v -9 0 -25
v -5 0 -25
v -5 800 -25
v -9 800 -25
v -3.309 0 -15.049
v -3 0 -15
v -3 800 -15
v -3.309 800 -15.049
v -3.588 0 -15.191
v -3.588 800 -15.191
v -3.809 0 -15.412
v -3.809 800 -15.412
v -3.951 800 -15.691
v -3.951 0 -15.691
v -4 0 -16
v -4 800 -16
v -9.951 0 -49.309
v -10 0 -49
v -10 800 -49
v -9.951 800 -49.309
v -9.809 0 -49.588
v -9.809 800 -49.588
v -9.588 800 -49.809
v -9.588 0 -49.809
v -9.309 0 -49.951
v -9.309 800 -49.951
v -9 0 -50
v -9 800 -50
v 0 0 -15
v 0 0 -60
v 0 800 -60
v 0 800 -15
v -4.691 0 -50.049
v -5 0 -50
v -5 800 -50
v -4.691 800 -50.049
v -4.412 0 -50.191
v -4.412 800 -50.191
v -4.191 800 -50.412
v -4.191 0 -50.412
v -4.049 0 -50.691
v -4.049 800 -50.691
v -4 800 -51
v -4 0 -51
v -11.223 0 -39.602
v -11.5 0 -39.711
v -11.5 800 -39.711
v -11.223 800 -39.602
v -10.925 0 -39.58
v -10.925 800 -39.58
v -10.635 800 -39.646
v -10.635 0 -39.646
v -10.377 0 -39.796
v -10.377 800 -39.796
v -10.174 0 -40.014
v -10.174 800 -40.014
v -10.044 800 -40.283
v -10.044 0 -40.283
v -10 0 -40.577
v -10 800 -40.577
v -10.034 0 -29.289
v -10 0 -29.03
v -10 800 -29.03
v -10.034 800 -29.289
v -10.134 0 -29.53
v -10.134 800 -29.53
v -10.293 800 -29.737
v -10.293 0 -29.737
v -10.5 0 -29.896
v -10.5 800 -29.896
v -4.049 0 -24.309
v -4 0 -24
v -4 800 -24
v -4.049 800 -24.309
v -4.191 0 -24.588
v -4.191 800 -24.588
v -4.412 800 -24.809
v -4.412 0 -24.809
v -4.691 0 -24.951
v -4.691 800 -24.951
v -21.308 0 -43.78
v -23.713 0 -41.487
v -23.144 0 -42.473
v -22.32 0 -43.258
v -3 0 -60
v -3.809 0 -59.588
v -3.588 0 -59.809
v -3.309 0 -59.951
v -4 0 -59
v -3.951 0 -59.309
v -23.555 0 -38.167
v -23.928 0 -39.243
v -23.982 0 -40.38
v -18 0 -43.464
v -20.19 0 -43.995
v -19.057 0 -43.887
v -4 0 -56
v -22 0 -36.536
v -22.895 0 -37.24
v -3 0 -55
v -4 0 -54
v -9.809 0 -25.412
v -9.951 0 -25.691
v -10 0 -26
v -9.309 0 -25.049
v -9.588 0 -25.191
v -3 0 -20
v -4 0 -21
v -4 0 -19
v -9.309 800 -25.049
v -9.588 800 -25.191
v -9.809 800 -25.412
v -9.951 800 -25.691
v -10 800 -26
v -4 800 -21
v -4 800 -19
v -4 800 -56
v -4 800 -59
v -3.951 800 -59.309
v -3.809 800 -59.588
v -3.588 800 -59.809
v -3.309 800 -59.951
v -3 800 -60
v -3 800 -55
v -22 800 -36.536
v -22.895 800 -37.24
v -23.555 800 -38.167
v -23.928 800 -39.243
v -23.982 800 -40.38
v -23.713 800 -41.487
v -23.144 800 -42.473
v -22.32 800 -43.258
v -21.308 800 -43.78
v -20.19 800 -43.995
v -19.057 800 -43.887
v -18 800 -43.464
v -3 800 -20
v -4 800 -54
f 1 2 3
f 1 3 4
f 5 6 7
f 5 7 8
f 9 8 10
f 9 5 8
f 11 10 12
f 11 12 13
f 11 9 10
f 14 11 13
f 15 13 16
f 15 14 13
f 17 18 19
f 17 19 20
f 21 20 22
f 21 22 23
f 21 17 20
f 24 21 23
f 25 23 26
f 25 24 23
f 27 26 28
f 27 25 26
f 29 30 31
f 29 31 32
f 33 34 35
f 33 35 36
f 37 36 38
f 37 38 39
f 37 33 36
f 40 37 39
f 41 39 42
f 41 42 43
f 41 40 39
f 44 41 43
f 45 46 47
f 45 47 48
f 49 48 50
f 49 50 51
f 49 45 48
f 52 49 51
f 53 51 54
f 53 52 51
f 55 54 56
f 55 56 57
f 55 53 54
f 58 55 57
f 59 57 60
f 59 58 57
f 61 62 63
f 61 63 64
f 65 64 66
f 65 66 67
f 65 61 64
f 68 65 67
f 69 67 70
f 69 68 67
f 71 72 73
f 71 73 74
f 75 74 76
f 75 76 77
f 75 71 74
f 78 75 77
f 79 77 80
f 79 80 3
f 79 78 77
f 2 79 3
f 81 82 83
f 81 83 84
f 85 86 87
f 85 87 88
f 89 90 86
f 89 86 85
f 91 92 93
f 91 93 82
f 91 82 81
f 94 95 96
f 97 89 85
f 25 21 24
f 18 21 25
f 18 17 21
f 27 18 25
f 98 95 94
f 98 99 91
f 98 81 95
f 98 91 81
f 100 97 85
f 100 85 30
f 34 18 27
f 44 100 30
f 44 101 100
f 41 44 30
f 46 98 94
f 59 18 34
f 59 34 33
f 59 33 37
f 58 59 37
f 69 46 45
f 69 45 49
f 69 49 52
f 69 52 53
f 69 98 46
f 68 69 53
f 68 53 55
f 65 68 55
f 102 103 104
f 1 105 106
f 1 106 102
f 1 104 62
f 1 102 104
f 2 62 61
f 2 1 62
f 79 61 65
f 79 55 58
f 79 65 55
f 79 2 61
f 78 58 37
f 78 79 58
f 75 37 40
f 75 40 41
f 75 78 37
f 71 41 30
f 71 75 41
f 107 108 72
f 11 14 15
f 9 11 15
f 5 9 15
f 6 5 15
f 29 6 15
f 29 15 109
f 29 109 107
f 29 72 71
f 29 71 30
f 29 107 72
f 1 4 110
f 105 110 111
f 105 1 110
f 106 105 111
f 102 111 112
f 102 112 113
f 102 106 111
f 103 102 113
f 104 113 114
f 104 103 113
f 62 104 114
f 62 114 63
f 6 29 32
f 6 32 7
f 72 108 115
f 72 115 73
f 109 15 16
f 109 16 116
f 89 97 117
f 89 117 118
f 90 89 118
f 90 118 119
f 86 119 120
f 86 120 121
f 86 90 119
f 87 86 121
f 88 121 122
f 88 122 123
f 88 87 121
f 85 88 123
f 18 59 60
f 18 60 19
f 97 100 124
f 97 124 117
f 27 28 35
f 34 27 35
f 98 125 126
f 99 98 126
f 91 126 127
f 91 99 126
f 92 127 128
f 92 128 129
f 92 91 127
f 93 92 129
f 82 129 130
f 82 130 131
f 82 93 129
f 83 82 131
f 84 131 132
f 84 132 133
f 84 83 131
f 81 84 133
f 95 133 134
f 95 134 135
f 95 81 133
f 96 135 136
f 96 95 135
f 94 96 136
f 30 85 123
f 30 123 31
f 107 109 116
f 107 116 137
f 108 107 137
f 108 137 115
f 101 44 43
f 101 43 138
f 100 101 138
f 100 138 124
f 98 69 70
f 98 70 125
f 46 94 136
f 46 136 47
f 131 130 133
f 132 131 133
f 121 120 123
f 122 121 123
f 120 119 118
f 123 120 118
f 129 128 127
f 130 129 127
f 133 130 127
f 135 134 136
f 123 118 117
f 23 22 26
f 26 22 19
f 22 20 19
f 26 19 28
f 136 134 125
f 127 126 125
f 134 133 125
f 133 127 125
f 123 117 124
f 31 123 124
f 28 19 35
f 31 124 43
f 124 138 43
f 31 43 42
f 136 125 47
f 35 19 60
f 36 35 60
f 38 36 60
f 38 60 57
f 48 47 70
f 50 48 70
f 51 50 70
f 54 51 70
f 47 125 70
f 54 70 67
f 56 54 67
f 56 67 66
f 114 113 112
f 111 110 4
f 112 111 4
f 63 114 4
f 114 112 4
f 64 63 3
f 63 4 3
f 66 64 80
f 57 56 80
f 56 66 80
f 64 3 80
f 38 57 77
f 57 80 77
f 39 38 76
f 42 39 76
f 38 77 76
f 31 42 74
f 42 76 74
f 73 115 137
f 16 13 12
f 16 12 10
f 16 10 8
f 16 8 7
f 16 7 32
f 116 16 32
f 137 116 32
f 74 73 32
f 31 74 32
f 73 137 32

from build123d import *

# Parameters (mm, degrees)
F1_DEPTH = 800


with BuildPart() as f1:
    # F0 (on Front) → F1 (new body)
    with BuildSketch(Plane.XZ):
        with BuildLine():
            ThreePointArc((-10, -29.030345), (-10.133975, -29.530345), (-10.5, -29.89637))
            Line((-10.5, -29.89637), (-22, -36.535898))
            ThreePointArc((-22, -36.535898), (-23.464102, -42), (-18, -43.464102))
            Line((-18, -43.464102), (-11.5, -39.711325))
            ThreePointArc((-11.5, -39.711325), (-10.5, -39.711325), (-10, -40.57735))
            Line((-10, -40.57735), (-10, -49))
            ThreePointArc((-10, -49), (-9.707107, -49.707107), (-9, -50))
            Line((-9, -50), (-5, -50))
            ThreePointArc((-5, -50), (-4.292893, -50.292893), (-4, -51))
            Line((-4, -51), (-4, -54))
            Line((-4, -54), (-3, -55))
            Line((-3, -55), (-4, -56))
            Line((-4, -56), (-4, -59))
            ThreePointArc((-4, -59), (-3.707107, -59.707107), (-3, -60))
            Line((-3, -60), (0, -60))
            Line((0, -60), (0, -15))
            Line((0, -15), (-3, -15))
            ThreePointArc((-3, -15), (-3.707107, -15.292893), (-4, -16))
            Line((-4, -16), (-4, -19))
            Line((-4, -19), (-3, -20))
            Line((-3, -20), (-4, -21))
            Line((-4, -21), (-4, -24))
            ThreePointArc((-4, -24), (-4.292893, -24.707107), (-5, -25))
            Line((-5, -25), (-9, -25))
            ThreePointArc((-9, -25), (-9.707107, -25.292893), (-10, -26))
            Line((-10, -26), (-10, -29.030345))
        make_face()
    extrude(amount=-F1_DEPTH)


solid = f1.part
